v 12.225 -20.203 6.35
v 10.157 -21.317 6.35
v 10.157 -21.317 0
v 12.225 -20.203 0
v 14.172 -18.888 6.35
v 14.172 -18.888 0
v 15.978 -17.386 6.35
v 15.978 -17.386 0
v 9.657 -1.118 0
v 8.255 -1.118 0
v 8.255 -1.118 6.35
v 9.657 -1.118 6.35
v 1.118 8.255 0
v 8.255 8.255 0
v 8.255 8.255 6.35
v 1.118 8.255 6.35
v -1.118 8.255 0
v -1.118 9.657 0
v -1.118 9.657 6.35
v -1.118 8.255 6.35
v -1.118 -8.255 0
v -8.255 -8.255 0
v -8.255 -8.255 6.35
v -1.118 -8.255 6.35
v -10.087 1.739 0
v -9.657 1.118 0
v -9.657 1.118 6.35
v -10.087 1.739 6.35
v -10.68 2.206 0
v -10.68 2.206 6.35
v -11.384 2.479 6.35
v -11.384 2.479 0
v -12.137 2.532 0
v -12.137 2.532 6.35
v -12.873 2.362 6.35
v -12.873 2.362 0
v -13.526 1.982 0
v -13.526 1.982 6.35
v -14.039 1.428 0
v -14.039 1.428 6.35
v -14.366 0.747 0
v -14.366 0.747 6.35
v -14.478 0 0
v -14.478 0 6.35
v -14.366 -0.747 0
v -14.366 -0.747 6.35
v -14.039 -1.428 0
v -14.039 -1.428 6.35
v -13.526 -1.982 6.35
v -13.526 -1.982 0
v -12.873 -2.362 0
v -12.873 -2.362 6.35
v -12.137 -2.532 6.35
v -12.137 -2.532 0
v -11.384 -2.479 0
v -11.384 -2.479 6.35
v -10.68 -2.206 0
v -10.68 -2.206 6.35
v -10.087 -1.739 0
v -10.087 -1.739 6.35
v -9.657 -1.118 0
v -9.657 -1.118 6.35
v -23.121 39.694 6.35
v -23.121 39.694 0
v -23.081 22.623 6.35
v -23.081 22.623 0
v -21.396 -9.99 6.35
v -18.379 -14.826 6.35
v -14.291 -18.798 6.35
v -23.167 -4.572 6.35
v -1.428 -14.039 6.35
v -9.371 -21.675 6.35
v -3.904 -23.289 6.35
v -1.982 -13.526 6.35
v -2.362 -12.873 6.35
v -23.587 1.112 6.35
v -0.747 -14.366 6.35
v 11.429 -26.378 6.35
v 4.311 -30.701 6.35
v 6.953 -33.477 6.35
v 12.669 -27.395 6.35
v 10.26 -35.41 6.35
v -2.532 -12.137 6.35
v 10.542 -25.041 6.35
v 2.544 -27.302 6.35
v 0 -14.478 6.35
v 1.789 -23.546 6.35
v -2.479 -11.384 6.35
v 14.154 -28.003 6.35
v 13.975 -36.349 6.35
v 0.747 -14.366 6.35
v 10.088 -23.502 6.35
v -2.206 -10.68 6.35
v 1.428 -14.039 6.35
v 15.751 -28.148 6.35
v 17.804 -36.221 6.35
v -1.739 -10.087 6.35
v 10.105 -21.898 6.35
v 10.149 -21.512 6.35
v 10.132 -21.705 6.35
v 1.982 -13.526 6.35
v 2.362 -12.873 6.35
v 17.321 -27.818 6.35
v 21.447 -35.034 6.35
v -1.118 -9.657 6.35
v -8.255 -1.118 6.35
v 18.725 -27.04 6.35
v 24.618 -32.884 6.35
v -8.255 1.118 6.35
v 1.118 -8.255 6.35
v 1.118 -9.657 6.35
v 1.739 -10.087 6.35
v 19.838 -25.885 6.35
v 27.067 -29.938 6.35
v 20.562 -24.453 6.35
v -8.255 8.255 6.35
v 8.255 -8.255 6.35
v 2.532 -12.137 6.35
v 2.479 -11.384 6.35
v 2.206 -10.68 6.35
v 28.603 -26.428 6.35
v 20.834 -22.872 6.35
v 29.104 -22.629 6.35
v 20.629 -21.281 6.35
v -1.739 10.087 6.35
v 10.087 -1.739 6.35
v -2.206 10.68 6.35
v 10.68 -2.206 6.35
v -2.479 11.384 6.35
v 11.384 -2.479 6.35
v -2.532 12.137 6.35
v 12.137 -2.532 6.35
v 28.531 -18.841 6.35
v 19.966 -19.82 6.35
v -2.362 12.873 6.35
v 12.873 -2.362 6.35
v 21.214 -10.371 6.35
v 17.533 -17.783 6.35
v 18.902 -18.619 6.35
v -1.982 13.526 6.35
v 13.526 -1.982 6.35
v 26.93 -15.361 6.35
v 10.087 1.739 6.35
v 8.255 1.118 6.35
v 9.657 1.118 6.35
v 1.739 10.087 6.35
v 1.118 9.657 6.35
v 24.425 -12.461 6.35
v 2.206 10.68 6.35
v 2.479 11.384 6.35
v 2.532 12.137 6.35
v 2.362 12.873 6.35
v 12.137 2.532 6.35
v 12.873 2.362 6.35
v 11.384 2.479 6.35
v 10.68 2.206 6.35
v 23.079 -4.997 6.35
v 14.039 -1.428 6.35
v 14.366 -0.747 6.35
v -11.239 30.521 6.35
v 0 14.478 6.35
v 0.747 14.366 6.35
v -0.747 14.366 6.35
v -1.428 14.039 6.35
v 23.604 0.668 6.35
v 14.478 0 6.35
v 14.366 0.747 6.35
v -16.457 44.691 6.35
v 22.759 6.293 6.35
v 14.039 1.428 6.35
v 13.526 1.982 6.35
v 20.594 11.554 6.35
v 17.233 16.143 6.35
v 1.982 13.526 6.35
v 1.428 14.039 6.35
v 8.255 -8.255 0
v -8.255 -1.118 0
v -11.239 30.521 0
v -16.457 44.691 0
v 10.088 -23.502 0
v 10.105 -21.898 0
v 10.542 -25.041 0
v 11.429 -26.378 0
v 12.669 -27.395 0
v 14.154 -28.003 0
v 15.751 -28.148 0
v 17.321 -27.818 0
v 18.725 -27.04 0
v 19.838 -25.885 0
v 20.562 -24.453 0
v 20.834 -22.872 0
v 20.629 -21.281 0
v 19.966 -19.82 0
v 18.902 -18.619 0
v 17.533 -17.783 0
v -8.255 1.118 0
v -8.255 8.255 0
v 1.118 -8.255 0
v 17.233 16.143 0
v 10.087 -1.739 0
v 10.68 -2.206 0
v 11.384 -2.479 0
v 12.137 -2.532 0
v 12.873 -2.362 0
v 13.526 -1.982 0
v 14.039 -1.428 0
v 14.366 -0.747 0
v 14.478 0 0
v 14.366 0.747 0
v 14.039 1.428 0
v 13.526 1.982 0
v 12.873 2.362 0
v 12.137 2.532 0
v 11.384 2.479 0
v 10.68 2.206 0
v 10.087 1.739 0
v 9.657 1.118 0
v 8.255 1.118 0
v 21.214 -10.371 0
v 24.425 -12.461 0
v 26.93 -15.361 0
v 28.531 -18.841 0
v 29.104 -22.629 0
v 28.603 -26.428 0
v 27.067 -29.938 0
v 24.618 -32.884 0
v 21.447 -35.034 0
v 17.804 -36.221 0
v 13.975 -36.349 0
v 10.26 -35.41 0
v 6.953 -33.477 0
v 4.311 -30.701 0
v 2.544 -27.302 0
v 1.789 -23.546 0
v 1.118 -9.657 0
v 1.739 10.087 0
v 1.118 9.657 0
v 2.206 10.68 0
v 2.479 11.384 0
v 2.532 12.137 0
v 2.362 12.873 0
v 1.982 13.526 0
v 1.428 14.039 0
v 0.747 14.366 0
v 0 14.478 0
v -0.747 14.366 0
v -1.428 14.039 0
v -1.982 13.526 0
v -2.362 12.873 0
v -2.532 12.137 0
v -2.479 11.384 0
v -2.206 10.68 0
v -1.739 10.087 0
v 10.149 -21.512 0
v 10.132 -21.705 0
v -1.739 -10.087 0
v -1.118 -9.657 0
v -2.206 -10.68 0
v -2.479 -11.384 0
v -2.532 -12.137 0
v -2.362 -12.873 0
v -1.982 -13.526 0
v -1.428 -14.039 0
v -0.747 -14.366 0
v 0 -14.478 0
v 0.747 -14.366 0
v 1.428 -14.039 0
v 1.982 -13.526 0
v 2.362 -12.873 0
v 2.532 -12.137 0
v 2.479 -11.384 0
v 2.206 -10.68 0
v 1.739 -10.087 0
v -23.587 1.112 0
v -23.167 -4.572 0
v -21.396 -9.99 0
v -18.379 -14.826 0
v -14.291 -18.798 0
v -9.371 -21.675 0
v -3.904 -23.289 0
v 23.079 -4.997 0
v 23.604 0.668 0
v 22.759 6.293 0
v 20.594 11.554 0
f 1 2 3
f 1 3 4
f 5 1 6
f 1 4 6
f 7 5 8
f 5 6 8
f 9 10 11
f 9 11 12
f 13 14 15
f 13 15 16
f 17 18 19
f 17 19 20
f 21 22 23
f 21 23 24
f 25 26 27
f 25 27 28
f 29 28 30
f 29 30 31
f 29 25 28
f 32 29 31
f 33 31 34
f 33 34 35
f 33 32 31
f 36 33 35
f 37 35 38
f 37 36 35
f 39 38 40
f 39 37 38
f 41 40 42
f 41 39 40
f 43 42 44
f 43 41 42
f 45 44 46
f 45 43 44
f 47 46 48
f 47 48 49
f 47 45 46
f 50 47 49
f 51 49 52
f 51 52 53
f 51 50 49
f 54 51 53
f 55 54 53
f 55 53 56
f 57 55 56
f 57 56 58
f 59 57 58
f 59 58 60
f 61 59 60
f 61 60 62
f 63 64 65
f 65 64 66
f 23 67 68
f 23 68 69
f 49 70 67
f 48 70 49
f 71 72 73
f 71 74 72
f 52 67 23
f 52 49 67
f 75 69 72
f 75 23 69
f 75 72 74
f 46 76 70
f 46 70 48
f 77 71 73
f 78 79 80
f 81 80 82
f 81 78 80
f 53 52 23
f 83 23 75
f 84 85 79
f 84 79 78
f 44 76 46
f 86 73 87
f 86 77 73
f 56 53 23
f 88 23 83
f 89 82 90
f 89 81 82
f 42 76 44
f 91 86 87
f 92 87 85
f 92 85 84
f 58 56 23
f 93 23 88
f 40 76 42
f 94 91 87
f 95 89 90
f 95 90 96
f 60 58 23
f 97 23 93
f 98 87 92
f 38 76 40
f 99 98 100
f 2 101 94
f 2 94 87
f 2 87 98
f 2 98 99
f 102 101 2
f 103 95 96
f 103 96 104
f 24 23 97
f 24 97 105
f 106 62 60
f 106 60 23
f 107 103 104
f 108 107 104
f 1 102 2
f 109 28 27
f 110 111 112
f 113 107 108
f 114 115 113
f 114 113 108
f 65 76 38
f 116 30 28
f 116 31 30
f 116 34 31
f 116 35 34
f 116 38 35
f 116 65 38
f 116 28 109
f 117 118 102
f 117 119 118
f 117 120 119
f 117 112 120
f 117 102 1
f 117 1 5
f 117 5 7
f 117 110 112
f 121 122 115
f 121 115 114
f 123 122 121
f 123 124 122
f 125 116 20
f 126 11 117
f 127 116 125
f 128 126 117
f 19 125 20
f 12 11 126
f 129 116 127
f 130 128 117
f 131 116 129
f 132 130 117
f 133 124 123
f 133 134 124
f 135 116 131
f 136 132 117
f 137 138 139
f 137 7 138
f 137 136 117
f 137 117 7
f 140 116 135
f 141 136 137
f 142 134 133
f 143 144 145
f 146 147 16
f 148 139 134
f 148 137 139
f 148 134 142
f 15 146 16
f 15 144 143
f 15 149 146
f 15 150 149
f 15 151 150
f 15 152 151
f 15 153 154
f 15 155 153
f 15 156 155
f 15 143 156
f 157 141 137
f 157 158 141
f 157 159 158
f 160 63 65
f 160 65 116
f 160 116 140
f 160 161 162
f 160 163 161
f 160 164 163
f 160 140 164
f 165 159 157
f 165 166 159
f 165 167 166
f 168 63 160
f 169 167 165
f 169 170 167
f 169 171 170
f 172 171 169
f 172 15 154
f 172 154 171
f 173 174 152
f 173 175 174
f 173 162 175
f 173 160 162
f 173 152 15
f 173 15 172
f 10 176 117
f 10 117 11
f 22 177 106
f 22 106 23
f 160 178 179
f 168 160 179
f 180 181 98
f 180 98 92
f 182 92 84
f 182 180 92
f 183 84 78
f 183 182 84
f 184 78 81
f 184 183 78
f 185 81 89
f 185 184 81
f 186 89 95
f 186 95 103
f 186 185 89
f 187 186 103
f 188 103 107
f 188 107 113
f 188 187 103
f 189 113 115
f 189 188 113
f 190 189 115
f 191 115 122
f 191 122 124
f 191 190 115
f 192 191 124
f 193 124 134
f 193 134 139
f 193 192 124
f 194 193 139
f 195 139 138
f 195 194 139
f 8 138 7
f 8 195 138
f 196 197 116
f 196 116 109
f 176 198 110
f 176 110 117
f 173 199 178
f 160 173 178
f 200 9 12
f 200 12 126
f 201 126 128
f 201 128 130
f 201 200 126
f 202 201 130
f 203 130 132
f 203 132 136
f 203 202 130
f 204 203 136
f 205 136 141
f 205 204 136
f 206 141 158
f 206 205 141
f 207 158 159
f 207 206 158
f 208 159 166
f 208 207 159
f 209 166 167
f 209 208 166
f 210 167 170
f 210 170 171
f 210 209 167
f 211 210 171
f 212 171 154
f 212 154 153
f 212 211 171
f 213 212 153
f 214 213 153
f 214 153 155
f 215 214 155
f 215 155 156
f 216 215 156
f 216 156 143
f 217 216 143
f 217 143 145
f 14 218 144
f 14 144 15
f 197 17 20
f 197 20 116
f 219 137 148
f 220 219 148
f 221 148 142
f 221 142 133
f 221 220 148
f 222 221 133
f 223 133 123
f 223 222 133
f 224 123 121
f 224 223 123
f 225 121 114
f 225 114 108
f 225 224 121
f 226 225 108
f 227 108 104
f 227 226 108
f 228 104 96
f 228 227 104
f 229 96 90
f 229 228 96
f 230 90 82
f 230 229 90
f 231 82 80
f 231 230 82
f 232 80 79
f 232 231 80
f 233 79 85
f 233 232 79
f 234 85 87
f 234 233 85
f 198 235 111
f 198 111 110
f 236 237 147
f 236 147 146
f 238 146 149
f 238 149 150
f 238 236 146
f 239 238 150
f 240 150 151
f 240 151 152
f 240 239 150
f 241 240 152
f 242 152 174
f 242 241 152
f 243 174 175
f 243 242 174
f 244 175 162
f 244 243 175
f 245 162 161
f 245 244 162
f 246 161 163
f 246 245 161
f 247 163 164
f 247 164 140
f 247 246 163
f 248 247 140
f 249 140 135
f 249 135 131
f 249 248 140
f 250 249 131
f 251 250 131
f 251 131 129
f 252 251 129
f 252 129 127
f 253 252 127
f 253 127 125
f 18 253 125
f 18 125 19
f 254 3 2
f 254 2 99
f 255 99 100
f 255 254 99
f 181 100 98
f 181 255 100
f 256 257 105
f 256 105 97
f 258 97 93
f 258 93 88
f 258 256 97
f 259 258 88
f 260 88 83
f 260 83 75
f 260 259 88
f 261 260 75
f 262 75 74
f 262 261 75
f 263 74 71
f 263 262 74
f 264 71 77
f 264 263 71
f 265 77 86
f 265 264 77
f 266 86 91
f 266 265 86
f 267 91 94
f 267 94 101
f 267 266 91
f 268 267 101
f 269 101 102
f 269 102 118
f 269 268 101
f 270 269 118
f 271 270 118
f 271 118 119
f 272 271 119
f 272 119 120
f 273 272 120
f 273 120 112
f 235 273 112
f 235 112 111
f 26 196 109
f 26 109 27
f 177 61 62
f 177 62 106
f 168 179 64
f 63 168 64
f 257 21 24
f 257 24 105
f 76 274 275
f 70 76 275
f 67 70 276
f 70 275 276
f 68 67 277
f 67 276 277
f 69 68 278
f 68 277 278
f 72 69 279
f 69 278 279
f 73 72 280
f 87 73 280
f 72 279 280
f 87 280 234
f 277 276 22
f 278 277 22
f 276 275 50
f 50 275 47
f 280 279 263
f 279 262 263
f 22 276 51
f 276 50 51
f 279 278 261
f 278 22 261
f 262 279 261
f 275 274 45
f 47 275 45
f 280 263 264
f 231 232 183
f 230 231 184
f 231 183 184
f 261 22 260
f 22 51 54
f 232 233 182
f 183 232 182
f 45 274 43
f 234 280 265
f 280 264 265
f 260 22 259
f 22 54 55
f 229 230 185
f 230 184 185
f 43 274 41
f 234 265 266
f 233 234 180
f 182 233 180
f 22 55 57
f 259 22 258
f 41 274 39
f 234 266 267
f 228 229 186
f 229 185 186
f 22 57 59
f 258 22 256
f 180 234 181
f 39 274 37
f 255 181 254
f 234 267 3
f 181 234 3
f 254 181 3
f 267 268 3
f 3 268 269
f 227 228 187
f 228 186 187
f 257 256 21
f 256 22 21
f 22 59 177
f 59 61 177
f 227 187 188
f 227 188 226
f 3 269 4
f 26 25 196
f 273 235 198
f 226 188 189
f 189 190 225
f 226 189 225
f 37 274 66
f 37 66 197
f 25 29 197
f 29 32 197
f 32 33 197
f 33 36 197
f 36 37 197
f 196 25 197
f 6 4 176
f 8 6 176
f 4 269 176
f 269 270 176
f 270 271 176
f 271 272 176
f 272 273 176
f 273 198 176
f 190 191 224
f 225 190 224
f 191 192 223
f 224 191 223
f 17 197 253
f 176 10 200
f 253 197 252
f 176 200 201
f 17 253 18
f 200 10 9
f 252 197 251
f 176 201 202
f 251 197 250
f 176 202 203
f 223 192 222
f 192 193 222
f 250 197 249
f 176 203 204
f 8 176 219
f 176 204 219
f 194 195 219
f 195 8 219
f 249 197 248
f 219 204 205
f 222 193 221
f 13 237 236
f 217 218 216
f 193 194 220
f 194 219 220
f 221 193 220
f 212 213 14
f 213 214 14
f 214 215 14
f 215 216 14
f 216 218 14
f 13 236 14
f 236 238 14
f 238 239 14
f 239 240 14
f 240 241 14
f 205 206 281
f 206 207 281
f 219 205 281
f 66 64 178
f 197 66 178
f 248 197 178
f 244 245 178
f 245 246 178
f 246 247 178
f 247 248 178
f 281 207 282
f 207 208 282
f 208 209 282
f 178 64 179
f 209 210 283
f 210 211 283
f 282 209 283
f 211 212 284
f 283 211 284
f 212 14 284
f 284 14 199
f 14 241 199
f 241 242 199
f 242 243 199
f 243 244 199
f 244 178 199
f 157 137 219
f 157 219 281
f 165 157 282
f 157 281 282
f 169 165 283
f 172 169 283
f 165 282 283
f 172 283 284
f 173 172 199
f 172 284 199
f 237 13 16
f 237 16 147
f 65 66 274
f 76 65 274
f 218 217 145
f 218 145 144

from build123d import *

# Parameters (mm, degrees)
BOSS_EXTRUDE1_DEPTH = 6.35
BOSS_EXTRUDE3_DEPTH = 6.35


with BuildPart() as part:
    # Sketch1 → Boss-Extrude1 (new body)
    with BuildSketch(Plane.XY):
        with BuildLine():
            Line((-23.080739782, 22.623363343), (-23.587362778, 1.111628824))
            ThreePointArc((-23.587362778, 1.111628824), (8.159769108, -22.158916254), (17.23339163, 16.143407769))
            Line((17.23339163, 16.143407769), (-11.238980923, 30.520917168))
            Line((-11.238980923, 30.520917168), (-16.457039411, 44.691234922))
            Line((-16.457039411, 44.691234922), (-23.120633834, 39.693776399))
            Line((-23.120633834, 39.693776399), (-23.080739782, 22.623363343))
        make_face()
        with BuildLine():
            ThreePointArc((1.1176, 9.657085657), (0, 14.478), (-1.1176, 9.657085657))
            Line((-1.1176, 9.657085657), (-1.1176, 8.255))
            Line((-1.1176, 8.255), (-8.255, 8.255))
            Line((-8.255, 8.255), (-8.255, 1.1176))
            Line((-8.255, 1.1176), (-9.657085657, 1.1176))
            ThreePointArc((-9.657085657, 1.1176), (-14.478, 0), (-9.657085657, -1.1176))
            Line((-9.657085657, -1.1176), (-8.255, -1.1176))
            Line((-8.255, -1.1176), (-8.255, -8.255))
            Line((-8.255, -8.255), (-1.1176, -8.255))
            Line((-1.1176, -8.255), (-1.1176, -9.657085657))
            ThreePointArc((-1.1176, -9.657085657), (0, -14.478), (1.1176, -9.657085657))
            Line((1.1176, -9.657085657), (1.1176, -8.255))
            Line((1.1176, -8.255), (8.255, -8.255))
            Line((8.255, -8.255), (8.255, -1.1176))
            Line((8.255, -1.1176), (9.657085657, -1.1176))
            ThreePointArc((9.657085657, -1.1176), (14.478, 0), (9.657085657, 1.1176))
            Line((9.657085657, 1.1176), (8.255, 1.1176))
            Line((8.255, 1.1176), (8.255, 8.255))
            Line((8.255, 8.255), (1.1176, 8.255))
            Line((1.1176, 8.255), (1.1176, 9.657085657))
        make_face(mode=Mode.SUBTRACT)
    extrude(amount=BOSS_EXTRUDE1_DEPTH)

    # Sketch2 → Boss-Extrude3 (add)
    with BuildSketch(Plane(origin=(0, 0, 0), x_dir=(-1, 0, 0), z_dir=(0, 0, -1))):
        with BuildLine():
            ThreePointArc((-13.902877587, -9.175702687), (-24.867617177, -32.651605631), (-1.941453441, -20.57954907))
            ThreePointArc((-1.941453441, -20.57954907), (-6.682478708, -17.156714595), (-10.105313182, -21.897739863))
            ThreePointArc((-10.105313182, -21.897739863), (-19.161295375, -26.666279881), (-14.830152685, -17.393147165))
            ThreePointArc((-14.830152685, -17.393147165), (-10.257792897, -13.748062475), (-13.902877587, -9.175702687))
        make_face()
    extrude(amount=-BOSS_EXTRUDE3_DEPTH)


solid = part.part
